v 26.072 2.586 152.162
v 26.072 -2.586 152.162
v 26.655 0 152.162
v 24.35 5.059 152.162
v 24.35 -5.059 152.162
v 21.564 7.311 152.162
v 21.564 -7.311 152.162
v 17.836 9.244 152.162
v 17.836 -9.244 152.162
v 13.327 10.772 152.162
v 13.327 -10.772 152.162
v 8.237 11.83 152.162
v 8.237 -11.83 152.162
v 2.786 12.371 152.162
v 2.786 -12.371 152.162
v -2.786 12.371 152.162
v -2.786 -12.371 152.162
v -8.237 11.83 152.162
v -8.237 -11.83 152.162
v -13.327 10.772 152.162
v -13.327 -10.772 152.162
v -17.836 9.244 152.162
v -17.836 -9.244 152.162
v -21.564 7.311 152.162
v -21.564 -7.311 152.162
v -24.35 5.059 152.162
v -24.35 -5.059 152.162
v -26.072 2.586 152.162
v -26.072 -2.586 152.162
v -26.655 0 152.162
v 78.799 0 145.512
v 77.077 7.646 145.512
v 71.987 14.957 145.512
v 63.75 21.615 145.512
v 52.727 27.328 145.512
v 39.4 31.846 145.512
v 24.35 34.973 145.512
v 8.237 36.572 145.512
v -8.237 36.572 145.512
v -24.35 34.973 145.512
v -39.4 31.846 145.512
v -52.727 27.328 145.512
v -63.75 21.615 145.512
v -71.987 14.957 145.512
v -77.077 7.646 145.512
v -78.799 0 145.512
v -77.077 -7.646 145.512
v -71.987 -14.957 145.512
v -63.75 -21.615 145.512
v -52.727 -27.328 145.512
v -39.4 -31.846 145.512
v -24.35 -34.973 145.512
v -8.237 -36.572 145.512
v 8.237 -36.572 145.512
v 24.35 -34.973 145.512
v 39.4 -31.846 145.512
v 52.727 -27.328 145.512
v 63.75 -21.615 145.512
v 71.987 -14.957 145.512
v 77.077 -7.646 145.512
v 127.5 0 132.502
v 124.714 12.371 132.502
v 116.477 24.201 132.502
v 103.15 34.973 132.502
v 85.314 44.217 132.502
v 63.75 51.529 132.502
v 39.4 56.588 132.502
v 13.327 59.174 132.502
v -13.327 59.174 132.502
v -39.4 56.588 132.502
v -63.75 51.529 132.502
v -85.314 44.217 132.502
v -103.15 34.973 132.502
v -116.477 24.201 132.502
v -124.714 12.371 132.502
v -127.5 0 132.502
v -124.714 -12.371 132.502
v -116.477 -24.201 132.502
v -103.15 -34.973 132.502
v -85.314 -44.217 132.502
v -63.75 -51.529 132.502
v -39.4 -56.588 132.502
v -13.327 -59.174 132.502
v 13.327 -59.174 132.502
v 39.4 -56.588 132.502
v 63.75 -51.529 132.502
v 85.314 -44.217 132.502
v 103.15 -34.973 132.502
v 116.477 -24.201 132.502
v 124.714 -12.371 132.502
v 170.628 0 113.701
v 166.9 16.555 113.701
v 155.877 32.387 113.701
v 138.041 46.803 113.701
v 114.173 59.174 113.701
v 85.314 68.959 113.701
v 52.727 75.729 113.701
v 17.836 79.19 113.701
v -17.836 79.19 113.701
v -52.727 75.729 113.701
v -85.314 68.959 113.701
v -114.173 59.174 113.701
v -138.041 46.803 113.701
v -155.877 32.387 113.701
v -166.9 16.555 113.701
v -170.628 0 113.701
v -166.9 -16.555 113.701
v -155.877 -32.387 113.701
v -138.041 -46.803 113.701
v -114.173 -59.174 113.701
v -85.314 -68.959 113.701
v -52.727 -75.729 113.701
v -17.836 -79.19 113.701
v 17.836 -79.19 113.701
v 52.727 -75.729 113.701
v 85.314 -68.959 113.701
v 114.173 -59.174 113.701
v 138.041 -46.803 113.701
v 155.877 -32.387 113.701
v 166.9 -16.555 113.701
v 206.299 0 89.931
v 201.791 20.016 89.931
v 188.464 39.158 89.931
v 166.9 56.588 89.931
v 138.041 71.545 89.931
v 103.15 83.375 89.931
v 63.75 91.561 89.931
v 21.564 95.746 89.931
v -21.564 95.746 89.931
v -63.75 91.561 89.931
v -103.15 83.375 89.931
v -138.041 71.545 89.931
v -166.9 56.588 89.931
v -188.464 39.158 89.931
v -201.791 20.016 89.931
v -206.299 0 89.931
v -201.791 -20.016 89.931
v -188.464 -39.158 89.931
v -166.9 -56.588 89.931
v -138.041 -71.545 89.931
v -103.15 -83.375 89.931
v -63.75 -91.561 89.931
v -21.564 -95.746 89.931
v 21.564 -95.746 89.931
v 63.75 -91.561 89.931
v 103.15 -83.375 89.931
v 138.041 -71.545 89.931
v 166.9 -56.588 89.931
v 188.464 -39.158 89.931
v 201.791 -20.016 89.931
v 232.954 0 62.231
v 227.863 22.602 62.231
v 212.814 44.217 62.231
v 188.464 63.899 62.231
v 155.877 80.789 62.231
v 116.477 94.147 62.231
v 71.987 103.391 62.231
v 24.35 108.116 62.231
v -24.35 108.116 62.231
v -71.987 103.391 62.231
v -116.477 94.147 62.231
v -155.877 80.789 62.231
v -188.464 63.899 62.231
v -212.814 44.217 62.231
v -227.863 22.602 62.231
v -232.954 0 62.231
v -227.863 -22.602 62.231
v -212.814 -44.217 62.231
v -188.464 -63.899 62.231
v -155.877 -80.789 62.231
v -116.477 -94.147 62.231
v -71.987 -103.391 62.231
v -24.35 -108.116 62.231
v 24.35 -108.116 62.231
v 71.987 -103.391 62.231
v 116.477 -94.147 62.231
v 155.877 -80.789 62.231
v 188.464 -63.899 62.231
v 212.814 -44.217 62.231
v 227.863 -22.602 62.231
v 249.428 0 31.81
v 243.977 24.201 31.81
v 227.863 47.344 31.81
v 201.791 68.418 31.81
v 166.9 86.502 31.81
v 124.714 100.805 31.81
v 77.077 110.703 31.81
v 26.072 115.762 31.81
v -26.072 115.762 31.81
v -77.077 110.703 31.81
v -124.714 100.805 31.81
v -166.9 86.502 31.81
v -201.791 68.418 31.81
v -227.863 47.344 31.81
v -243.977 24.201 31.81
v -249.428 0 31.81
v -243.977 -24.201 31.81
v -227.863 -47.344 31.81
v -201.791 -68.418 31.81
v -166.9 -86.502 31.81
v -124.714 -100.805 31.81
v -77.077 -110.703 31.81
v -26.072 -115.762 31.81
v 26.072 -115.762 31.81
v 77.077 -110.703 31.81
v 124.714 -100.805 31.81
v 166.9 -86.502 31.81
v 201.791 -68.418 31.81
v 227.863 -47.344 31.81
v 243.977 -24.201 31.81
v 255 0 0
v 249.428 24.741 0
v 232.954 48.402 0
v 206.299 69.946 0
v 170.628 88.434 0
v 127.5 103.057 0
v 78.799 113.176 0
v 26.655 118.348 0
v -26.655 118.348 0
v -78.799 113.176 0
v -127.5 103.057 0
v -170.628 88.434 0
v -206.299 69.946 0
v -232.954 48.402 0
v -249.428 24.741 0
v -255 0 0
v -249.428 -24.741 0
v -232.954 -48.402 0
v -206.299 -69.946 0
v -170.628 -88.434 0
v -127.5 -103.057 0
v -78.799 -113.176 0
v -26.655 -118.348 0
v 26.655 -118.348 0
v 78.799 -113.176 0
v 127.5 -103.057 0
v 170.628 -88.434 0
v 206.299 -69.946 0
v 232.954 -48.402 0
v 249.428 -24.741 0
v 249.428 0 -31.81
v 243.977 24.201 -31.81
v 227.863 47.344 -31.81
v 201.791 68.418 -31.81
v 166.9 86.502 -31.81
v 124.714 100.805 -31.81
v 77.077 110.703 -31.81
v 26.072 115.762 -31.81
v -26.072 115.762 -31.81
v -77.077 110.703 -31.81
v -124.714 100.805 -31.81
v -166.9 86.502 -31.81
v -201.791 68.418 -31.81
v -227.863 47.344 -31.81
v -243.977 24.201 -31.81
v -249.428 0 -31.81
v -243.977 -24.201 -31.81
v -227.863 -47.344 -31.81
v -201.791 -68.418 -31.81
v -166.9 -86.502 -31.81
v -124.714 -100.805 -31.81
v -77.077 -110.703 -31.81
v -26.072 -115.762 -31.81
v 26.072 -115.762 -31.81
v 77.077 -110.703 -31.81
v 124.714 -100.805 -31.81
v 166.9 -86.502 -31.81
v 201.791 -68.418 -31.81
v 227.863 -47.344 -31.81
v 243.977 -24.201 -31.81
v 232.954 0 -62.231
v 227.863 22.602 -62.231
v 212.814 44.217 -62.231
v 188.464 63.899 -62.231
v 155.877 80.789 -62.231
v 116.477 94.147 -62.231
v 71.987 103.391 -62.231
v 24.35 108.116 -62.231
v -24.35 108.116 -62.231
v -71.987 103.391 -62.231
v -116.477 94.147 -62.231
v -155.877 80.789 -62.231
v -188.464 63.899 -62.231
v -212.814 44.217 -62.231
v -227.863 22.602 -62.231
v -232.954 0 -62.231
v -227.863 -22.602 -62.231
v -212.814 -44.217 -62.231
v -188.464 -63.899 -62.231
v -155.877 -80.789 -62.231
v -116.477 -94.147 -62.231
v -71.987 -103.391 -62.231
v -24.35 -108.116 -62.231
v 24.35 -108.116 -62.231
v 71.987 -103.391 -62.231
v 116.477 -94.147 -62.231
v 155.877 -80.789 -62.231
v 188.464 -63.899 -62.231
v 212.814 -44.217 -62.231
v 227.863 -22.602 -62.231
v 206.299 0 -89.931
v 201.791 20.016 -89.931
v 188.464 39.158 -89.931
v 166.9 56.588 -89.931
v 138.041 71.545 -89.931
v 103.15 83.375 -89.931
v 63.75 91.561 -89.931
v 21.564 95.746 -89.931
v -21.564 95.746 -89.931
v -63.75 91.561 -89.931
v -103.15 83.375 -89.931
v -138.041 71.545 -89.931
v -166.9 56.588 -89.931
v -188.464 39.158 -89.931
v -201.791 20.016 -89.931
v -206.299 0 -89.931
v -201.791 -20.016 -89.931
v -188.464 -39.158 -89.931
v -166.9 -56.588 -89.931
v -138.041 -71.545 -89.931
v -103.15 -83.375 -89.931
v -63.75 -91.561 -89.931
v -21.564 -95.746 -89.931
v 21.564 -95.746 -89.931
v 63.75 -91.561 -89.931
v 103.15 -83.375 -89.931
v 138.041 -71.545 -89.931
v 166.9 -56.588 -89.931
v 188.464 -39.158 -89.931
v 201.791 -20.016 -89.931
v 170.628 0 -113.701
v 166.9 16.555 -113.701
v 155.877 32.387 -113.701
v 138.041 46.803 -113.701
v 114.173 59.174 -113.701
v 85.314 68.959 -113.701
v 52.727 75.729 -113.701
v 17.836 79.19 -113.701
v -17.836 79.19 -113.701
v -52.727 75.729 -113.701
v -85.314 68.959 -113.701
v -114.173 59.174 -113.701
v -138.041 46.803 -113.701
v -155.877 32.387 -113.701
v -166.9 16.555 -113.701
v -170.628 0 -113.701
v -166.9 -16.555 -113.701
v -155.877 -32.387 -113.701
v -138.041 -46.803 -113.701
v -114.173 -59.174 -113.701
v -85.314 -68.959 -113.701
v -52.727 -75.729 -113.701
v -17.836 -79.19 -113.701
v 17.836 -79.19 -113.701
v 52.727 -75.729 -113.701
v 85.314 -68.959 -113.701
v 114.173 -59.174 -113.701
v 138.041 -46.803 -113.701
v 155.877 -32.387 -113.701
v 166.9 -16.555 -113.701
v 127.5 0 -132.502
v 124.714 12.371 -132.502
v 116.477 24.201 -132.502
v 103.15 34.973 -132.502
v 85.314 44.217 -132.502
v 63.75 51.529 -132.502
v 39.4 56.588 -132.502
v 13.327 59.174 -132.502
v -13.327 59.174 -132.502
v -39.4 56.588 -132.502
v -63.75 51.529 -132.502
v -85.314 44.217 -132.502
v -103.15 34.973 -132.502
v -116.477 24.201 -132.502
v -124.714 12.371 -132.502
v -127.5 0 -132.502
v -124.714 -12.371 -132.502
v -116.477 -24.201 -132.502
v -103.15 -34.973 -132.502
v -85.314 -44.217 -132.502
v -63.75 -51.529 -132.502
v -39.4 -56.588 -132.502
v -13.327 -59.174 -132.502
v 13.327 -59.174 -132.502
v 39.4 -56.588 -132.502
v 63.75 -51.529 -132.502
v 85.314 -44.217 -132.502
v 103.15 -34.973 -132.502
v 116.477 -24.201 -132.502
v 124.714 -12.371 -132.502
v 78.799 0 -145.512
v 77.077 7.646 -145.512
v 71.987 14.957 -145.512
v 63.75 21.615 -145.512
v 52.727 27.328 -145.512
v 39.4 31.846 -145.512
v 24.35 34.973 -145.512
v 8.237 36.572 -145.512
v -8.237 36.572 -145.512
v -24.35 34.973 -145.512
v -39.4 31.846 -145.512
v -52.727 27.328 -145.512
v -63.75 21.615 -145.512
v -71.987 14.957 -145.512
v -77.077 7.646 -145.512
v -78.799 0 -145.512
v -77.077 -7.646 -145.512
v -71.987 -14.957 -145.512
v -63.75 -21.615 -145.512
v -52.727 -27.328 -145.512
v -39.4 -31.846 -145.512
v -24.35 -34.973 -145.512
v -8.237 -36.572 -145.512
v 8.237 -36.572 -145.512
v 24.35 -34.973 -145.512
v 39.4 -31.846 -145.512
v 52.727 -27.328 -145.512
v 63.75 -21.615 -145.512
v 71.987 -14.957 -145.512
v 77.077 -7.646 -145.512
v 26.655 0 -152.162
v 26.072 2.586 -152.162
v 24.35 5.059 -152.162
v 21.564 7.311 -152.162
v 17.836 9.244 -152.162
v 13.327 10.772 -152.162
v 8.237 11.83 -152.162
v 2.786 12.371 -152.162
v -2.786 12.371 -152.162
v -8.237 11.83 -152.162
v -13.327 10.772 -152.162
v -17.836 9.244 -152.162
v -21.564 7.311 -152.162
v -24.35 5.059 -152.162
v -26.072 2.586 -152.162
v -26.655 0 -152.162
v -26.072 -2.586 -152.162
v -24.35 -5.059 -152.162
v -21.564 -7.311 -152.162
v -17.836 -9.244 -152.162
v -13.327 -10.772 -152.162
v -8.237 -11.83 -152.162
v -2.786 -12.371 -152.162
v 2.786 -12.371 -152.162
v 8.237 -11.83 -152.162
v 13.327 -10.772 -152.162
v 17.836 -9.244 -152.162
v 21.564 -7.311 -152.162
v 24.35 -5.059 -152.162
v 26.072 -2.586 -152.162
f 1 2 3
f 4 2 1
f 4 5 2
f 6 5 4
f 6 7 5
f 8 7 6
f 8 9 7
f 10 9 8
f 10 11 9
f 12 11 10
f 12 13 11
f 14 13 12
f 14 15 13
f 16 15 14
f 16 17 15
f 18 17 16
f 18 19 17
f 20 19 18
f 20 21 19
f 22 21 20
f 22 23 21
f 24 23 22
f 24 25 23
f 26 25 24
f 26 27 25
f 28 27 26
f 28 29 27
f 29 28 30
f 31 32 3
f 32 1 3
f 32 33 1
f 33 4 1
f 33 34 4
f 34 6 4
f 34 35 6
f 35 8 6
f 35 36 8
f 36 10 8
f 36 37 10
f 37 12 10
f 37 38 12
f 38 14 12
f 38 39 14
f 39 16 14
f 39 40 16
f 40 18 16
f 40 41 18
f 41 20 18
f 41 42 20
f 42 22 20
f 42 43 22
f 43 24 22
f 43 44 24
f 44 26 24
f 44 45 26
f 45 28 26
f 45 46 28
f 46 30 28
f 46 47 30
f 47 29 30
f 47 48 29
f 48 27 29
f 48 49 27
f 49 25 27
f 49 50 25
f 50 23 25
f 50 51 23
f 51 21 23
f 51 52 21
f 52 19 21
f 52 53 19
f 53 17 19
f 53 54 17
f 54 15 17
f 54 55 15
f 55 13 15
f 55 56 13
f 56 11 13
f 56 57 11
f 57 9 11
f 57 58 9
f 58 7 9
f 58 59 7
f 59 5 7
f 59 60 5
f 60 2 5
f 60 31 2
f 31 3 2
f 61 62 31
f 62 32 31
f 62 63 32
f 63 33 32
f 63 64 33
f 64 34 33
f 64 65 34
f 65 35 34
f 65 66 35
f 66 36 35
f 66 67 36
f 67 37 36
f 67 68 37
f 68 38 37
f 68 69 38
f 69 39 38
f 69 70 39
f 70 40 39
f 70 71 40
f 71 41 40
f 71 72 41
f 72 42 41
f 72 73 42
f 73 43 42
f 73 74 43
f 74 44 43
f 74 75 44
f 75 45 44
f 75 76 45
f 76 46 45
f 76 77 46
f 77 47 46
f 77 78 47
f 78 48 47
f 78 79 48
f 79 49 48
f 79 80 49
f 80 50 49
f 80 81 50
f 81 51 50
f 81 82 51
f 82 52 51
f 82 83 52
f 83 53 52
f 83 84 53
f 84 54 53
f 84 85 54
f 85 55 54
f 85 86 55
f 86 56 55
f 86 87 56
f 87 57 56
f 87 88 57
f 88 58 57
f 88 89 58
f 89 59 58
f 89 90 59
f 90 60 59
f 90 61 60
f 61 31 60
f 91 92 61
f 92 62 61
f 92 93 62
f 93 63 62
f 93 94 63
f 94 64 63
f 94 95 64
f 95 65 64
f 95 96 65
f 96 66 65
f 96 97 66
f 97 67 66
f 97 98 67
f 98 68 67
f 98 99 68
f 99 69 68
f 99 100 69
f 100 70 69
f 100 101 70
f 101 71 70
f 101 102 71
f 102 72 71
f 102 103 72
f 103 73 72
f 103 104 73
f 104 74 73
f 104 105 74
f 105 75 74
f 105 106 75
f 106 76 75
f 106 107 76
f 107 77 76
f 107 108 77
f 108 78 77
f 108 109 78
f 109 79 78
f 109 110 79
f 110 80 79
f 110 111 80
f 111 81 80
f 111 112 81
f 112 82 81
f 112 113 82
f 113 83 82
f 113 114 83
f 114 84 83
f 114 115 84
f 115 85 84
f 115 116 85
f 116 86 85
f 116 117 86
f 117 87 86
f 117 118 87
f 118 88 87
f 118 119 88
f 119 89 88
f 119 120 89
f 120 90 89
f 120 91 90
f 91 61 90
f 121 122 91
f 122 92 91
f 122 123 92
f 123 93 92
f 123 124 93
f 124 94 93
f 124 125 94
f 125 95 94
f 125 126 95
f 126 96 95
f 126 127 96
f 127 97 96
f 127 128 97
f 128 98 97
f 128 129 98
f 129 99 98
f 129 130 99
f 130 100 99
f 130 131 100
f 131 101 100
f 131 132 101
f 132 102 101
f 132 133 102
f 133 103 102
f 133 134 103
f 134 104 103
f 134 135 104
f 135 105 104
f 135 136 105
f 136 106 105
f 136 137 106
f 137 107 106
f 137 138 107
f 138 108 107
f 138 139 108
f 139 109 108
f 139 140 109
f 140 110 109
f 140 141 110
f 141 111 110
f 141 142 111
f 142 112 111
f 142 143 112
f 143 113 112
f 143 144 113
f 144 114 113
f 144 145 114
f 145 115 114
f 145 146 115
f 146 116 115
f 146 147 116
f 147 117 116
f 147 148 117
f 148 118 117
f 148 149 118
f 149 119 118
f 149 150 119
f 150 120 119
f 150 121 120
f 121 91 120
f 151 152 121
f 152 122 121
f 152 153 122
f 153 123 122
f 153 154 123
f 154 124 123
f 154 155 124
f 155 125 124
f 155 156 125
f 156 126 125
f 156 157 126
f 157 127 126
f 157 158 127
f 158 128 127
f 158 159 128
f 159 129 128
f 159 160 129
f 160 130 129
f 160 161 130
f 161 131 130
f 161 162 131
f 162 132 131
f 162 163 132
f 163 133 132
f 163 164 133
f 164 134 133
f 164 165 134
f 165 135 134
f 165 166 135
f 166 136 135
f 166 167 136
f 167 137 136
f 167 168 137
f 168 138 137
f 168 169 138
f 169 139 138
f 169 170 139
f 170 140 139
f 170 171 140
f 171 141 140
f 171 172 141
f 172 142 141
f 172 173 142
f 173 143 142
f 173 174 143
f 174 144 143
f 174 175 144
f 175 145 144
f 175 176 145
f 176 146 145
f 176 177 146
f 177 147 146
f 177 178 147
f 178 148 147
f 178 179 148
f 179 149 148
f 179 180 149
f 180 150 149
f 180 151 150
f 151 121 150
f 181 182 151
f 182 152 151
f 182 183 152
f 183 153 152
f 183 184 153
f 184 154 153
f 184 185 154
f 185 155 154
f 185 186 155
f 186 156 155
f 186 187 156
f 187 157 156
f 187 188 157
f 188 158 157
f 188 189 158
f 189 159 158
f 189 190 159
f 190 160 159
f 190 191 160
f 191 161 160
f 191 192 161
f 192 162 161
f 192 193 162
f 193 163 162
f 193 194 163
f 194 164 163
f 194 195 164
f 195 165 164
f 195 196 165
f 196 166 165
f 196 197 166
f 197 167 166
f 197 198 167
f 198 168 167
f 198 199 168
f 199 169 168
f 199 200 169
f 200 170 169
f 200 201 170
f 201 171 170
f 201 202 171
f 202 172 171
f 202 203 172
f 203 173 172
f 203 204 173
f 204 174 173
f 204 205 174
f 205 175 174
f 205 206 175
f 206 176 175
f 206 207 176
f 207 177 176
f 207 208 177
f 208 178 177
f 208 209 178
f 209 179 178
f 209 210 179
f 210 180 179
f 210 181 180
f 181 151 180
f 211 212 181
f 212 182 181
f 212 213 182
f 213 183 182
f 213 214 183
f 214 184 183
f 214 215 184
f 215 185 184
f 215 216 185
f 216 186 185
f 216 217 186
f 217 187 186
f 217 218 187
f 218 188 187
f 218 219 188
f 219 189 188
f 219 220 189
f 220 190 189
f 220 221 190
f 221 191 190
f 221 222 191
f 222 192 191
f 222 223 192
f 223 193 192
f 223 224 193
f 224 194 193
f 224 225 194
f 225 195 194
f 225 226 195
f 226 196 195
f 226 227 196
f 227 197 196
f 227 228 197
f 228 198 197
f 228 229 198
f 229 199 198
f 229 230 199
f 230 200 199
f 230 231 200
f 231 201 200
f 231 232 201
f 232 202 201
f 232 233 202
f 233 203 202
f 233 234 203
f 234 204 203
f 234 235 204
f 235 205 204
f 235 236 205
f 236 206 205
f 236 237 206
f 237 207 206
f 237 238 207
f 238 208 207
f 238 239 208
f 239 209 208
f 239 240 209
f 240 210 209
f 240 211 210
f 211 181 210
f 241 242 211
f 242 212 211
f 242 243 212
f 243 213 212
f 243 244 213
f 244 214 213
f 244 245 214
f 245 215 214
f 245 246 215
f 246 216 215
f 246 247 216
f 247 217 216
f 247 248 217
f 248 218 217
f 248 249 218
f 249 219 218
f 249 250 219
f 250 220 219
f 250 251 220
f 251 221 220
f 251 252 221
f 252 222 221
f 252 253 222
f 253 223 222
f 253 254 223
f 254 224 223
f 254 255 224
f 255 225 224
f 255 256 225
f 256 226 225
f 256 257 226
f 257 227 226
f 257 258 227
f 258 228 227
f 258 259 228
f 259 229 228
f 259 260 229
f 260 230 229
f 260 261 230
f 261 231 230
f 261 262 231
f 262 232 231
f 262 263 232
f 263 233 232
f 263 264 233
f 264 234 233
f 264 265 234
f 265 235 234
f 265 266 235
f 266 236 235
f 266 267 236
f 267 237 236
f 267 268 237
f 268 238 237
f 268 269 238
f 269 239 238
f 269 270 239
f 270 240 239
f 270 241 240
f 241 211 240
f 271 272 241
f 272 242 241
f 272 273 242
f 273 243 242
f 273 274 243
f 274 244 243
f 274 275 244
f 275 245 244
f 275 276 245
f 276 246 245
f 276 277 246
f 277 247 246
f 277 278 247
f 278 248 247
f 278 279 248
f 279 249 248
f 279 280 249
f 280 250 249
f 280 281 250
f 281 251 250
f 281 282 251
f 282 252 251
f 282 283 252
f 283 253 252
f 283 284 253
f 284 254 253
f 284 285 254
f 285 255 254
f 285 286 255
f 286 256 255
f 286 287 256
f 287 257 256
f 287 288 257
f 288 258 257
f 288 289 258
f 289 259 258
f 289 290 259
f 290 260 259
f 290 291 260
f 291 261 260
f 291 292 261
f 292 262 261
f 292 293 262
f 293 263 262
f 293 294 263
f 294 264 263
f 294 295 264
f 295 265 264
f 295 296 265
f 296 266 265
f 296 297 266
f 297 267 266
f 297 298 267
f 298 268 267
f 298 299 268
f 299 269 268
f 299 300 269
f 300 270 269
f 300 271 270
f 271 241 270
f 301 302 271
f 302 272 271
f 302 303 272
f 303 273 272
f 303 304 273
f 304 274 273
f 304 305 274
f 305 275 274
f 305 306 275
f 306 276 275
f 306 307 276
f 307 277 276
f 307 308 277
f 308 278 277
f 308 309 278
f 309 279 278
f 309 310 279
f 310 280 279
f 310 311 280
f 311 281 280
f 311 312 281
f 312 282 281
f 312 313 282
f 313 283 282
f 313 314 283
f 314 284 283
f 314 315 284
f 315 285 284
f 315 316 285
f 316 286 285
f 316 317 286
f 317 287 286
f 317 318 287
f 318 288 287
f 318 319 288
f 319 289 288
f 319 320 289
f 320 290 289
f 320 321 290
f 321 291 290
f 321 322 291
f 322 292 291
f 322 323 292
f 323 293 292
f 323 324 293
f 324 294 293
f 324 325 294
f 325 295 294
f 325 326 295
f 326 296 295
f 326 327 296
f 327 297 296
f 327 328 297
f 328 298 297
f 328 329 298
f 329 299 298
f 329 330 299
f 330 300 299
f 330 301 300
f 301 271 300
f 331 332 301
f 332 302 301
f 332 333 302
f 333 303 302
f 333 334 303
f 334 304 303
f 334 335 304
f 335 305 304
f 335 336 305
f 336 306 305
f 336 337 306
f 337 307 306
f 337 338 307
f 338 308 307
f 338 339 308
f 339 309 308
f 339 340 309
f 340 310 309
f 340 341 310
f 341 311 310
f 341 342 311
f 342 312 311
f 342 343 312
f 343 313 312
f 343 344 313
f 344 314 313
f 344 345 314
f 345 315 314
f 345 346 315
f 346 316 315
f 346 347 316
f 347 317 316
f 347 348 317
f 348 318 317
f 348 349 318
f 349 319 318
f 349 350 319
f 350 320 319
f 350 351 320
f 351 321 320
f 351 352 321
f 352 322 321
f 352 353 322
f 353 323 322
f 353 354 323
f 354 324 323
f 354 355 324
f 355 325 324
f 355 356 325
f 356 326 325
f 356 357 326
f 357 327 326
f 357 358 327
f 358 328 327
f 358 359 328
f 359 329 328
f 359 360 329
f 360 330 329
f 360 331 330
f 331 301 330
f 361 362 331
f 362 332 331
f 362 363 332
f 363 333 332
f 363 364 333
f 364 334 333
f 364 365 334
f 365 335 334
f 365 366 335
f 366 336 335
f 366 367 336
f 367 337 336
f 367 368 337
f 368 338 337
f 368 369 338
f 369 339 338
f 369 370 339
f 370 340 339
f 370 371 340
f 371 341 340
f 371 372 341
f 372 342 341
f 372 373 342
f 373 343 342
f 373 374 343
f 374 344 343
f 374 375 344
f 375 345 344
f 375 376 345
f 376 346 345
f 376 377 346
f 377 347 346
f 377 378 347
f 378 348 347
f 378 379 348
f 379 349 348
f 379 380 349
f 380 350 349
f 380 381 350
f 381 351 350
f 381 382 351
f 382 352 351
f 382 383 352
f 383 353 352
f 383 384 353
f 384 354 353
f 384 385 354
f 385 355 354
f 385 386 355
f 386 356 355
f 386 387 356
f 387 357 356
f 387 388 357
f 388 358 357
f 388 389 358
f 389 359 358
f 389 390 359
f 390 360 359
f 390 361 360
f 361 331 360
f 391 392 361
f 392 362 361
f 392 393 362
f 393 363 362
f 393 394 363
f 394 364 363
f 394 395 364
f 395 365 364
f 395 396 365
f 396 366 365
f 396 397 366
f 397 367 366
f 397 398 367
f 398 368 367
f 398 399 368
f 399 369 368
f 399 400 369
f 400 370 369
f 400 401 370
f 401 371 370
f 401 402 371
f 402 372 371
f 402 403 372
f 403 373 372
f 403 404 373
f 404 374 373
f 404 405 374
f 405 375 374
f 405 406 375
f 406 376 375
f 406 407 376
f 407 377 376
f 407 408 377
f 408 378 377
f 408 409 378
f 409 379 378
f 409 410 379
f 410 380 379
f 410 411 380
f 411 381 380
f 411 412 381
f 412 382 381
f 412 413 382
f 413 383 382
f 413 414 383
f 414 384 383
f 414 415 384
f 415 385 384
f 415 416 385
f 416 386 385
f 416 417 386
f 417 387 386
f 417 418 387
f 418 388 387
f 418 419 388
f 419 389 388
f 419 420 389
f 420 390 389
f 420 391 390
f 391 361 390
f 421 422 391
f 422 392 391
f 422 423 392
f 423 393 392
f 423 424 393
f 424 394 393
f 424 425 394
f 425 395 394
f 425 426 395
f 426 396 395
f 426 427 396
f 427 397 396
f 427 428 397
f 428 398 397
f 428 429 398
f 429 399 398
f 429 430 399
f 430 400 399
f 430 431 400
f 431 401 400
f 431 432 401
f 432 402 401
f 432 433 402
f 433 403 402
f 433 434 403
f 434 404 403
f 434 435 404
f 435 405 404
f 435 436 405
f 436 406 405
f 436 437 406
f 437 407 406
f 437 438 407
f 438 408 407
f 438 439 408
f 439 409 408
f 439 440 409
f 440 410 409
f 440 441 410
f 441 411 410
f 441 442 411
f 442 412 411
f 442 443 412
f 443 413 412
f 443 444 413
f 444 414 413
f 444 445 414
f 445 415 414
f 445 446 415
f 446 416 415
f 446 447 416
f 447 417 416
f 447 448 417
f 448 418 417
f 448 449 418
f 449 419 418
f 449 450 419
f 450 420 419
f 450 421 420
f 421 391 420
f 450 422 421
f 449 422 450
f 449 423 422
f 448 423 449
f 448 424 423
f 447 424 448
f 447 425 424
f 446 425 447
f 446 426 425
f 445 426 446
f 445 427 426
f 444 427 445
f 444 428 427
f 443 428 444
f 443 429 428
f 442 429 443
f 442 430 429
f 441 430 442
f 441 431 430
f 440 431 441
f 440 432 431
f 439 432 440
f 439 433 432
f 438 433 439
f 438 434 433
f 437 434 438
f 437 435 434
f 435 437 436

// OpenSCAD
// Generated by SolidPython 1.0.1 on 2020-07-29 00:46:51


scale(v = [15, 7, 9]) {
	sphere(r = 17);
}
/***********************************************
*********      SolidPython code:      **********
************************************************
 
# import packages: SolidPython
from solid import *
from solid.utils import *
from itertools import chain, combinations, permutations


class Resize:

    def __init__(self, scad_file):
        self.scad_file = scad_file
        #self.scad_file = import_scad(scad_file)
        # cone/cylinder param:
        self.r1 = 0
        self.r2 = 0
        self.h = 0
        # rectangular prism param:
        self.w = 0
        self.l = 0
        # ellipse param:
        self.r = 0

    # import OpenScad code (file name corresponds to shape)


    # classify shape + parameters
    def assign(self, param1, param2, param3):
        if self.scad_file == 'cone.scad':
            self.r1 = param1
            self.r2 = param2
            self.h = param3
        elif self.scad_file == 'cylinder.scad':
            self.r1 = param1
            self.r2 = param2
            self.h = param3
        elif self.scad_file == 'rectangularPrism.scad':
            self.h = param1
            self.l = param2
            self.w = param3
        else:
            self.r = param1
            self.h = param2

    # resize parameters
    def iterate(self):
        x = range(3, 20, 2)
        i = 1
        if self.scad_file == 'cone.scad':
            tempList = list(permutations(x, 2))
            for temp in tempList:
                param1 = temp[0]
                param2 = temp[1]
                filepath = 'produced_scad_files/' + 'cone' + str(param1) + '_' + str(param2) + '_' + '.scad'
                scad_render_to_file(cylinder(h=param1, r1=param2, r2=0), filepath)

        elif self.scad_file == 'cylinder.scad':
            tempList = list(permutations(x, 3))
            for temp in tempList:
                param1 = temp[0]
                param2 = temp[1]
                filepath = 'produced_scad_files/' + 'cylinder' + str(param1) + '_' + str(param2) + '_' + '.scad'
                scad_render_to_file(cylinder(h=param1, r1=param2, r2=param2), filepath)

        elif self.scad_file == 'rectangularPrism.scad':
            tempList = list(permutations(x, 3))
            for temp in tempList:
                param1 = temp[0]
                param2 = temp[1]
                param3 = temp[2]
                filepath = 'produced_scad_files/' + 'rectangularPrism' + str(param1) + '_' + str(param2) + '_' + str(
                    param3) + '.scad'
                scad_render_to_file(cube(size=(param1, param2, param3)), filepath)

        elif self.scad_file == 'ellipse.scad':
            tempList = list(permutations(x, 4))
            for temp in tempList:
                param1 = temp[0]
                param2 = temp[1]
                param3 = temp[2]
                param4 = temp[3]
                filepath = 'produced_scad_files/' + 'ellipse' + str(param1) + '_' + str(param2) + '_' + str(param3) + '_' + str(param4) + '.scad'
                scad_render_to_file(scale([param1, param2, param3])(sphere(r=param4)), filepath)

    def render_to_scadfile(self):
        scad_render_to_file(scad, 'example.scad') 
 
************************************************/
